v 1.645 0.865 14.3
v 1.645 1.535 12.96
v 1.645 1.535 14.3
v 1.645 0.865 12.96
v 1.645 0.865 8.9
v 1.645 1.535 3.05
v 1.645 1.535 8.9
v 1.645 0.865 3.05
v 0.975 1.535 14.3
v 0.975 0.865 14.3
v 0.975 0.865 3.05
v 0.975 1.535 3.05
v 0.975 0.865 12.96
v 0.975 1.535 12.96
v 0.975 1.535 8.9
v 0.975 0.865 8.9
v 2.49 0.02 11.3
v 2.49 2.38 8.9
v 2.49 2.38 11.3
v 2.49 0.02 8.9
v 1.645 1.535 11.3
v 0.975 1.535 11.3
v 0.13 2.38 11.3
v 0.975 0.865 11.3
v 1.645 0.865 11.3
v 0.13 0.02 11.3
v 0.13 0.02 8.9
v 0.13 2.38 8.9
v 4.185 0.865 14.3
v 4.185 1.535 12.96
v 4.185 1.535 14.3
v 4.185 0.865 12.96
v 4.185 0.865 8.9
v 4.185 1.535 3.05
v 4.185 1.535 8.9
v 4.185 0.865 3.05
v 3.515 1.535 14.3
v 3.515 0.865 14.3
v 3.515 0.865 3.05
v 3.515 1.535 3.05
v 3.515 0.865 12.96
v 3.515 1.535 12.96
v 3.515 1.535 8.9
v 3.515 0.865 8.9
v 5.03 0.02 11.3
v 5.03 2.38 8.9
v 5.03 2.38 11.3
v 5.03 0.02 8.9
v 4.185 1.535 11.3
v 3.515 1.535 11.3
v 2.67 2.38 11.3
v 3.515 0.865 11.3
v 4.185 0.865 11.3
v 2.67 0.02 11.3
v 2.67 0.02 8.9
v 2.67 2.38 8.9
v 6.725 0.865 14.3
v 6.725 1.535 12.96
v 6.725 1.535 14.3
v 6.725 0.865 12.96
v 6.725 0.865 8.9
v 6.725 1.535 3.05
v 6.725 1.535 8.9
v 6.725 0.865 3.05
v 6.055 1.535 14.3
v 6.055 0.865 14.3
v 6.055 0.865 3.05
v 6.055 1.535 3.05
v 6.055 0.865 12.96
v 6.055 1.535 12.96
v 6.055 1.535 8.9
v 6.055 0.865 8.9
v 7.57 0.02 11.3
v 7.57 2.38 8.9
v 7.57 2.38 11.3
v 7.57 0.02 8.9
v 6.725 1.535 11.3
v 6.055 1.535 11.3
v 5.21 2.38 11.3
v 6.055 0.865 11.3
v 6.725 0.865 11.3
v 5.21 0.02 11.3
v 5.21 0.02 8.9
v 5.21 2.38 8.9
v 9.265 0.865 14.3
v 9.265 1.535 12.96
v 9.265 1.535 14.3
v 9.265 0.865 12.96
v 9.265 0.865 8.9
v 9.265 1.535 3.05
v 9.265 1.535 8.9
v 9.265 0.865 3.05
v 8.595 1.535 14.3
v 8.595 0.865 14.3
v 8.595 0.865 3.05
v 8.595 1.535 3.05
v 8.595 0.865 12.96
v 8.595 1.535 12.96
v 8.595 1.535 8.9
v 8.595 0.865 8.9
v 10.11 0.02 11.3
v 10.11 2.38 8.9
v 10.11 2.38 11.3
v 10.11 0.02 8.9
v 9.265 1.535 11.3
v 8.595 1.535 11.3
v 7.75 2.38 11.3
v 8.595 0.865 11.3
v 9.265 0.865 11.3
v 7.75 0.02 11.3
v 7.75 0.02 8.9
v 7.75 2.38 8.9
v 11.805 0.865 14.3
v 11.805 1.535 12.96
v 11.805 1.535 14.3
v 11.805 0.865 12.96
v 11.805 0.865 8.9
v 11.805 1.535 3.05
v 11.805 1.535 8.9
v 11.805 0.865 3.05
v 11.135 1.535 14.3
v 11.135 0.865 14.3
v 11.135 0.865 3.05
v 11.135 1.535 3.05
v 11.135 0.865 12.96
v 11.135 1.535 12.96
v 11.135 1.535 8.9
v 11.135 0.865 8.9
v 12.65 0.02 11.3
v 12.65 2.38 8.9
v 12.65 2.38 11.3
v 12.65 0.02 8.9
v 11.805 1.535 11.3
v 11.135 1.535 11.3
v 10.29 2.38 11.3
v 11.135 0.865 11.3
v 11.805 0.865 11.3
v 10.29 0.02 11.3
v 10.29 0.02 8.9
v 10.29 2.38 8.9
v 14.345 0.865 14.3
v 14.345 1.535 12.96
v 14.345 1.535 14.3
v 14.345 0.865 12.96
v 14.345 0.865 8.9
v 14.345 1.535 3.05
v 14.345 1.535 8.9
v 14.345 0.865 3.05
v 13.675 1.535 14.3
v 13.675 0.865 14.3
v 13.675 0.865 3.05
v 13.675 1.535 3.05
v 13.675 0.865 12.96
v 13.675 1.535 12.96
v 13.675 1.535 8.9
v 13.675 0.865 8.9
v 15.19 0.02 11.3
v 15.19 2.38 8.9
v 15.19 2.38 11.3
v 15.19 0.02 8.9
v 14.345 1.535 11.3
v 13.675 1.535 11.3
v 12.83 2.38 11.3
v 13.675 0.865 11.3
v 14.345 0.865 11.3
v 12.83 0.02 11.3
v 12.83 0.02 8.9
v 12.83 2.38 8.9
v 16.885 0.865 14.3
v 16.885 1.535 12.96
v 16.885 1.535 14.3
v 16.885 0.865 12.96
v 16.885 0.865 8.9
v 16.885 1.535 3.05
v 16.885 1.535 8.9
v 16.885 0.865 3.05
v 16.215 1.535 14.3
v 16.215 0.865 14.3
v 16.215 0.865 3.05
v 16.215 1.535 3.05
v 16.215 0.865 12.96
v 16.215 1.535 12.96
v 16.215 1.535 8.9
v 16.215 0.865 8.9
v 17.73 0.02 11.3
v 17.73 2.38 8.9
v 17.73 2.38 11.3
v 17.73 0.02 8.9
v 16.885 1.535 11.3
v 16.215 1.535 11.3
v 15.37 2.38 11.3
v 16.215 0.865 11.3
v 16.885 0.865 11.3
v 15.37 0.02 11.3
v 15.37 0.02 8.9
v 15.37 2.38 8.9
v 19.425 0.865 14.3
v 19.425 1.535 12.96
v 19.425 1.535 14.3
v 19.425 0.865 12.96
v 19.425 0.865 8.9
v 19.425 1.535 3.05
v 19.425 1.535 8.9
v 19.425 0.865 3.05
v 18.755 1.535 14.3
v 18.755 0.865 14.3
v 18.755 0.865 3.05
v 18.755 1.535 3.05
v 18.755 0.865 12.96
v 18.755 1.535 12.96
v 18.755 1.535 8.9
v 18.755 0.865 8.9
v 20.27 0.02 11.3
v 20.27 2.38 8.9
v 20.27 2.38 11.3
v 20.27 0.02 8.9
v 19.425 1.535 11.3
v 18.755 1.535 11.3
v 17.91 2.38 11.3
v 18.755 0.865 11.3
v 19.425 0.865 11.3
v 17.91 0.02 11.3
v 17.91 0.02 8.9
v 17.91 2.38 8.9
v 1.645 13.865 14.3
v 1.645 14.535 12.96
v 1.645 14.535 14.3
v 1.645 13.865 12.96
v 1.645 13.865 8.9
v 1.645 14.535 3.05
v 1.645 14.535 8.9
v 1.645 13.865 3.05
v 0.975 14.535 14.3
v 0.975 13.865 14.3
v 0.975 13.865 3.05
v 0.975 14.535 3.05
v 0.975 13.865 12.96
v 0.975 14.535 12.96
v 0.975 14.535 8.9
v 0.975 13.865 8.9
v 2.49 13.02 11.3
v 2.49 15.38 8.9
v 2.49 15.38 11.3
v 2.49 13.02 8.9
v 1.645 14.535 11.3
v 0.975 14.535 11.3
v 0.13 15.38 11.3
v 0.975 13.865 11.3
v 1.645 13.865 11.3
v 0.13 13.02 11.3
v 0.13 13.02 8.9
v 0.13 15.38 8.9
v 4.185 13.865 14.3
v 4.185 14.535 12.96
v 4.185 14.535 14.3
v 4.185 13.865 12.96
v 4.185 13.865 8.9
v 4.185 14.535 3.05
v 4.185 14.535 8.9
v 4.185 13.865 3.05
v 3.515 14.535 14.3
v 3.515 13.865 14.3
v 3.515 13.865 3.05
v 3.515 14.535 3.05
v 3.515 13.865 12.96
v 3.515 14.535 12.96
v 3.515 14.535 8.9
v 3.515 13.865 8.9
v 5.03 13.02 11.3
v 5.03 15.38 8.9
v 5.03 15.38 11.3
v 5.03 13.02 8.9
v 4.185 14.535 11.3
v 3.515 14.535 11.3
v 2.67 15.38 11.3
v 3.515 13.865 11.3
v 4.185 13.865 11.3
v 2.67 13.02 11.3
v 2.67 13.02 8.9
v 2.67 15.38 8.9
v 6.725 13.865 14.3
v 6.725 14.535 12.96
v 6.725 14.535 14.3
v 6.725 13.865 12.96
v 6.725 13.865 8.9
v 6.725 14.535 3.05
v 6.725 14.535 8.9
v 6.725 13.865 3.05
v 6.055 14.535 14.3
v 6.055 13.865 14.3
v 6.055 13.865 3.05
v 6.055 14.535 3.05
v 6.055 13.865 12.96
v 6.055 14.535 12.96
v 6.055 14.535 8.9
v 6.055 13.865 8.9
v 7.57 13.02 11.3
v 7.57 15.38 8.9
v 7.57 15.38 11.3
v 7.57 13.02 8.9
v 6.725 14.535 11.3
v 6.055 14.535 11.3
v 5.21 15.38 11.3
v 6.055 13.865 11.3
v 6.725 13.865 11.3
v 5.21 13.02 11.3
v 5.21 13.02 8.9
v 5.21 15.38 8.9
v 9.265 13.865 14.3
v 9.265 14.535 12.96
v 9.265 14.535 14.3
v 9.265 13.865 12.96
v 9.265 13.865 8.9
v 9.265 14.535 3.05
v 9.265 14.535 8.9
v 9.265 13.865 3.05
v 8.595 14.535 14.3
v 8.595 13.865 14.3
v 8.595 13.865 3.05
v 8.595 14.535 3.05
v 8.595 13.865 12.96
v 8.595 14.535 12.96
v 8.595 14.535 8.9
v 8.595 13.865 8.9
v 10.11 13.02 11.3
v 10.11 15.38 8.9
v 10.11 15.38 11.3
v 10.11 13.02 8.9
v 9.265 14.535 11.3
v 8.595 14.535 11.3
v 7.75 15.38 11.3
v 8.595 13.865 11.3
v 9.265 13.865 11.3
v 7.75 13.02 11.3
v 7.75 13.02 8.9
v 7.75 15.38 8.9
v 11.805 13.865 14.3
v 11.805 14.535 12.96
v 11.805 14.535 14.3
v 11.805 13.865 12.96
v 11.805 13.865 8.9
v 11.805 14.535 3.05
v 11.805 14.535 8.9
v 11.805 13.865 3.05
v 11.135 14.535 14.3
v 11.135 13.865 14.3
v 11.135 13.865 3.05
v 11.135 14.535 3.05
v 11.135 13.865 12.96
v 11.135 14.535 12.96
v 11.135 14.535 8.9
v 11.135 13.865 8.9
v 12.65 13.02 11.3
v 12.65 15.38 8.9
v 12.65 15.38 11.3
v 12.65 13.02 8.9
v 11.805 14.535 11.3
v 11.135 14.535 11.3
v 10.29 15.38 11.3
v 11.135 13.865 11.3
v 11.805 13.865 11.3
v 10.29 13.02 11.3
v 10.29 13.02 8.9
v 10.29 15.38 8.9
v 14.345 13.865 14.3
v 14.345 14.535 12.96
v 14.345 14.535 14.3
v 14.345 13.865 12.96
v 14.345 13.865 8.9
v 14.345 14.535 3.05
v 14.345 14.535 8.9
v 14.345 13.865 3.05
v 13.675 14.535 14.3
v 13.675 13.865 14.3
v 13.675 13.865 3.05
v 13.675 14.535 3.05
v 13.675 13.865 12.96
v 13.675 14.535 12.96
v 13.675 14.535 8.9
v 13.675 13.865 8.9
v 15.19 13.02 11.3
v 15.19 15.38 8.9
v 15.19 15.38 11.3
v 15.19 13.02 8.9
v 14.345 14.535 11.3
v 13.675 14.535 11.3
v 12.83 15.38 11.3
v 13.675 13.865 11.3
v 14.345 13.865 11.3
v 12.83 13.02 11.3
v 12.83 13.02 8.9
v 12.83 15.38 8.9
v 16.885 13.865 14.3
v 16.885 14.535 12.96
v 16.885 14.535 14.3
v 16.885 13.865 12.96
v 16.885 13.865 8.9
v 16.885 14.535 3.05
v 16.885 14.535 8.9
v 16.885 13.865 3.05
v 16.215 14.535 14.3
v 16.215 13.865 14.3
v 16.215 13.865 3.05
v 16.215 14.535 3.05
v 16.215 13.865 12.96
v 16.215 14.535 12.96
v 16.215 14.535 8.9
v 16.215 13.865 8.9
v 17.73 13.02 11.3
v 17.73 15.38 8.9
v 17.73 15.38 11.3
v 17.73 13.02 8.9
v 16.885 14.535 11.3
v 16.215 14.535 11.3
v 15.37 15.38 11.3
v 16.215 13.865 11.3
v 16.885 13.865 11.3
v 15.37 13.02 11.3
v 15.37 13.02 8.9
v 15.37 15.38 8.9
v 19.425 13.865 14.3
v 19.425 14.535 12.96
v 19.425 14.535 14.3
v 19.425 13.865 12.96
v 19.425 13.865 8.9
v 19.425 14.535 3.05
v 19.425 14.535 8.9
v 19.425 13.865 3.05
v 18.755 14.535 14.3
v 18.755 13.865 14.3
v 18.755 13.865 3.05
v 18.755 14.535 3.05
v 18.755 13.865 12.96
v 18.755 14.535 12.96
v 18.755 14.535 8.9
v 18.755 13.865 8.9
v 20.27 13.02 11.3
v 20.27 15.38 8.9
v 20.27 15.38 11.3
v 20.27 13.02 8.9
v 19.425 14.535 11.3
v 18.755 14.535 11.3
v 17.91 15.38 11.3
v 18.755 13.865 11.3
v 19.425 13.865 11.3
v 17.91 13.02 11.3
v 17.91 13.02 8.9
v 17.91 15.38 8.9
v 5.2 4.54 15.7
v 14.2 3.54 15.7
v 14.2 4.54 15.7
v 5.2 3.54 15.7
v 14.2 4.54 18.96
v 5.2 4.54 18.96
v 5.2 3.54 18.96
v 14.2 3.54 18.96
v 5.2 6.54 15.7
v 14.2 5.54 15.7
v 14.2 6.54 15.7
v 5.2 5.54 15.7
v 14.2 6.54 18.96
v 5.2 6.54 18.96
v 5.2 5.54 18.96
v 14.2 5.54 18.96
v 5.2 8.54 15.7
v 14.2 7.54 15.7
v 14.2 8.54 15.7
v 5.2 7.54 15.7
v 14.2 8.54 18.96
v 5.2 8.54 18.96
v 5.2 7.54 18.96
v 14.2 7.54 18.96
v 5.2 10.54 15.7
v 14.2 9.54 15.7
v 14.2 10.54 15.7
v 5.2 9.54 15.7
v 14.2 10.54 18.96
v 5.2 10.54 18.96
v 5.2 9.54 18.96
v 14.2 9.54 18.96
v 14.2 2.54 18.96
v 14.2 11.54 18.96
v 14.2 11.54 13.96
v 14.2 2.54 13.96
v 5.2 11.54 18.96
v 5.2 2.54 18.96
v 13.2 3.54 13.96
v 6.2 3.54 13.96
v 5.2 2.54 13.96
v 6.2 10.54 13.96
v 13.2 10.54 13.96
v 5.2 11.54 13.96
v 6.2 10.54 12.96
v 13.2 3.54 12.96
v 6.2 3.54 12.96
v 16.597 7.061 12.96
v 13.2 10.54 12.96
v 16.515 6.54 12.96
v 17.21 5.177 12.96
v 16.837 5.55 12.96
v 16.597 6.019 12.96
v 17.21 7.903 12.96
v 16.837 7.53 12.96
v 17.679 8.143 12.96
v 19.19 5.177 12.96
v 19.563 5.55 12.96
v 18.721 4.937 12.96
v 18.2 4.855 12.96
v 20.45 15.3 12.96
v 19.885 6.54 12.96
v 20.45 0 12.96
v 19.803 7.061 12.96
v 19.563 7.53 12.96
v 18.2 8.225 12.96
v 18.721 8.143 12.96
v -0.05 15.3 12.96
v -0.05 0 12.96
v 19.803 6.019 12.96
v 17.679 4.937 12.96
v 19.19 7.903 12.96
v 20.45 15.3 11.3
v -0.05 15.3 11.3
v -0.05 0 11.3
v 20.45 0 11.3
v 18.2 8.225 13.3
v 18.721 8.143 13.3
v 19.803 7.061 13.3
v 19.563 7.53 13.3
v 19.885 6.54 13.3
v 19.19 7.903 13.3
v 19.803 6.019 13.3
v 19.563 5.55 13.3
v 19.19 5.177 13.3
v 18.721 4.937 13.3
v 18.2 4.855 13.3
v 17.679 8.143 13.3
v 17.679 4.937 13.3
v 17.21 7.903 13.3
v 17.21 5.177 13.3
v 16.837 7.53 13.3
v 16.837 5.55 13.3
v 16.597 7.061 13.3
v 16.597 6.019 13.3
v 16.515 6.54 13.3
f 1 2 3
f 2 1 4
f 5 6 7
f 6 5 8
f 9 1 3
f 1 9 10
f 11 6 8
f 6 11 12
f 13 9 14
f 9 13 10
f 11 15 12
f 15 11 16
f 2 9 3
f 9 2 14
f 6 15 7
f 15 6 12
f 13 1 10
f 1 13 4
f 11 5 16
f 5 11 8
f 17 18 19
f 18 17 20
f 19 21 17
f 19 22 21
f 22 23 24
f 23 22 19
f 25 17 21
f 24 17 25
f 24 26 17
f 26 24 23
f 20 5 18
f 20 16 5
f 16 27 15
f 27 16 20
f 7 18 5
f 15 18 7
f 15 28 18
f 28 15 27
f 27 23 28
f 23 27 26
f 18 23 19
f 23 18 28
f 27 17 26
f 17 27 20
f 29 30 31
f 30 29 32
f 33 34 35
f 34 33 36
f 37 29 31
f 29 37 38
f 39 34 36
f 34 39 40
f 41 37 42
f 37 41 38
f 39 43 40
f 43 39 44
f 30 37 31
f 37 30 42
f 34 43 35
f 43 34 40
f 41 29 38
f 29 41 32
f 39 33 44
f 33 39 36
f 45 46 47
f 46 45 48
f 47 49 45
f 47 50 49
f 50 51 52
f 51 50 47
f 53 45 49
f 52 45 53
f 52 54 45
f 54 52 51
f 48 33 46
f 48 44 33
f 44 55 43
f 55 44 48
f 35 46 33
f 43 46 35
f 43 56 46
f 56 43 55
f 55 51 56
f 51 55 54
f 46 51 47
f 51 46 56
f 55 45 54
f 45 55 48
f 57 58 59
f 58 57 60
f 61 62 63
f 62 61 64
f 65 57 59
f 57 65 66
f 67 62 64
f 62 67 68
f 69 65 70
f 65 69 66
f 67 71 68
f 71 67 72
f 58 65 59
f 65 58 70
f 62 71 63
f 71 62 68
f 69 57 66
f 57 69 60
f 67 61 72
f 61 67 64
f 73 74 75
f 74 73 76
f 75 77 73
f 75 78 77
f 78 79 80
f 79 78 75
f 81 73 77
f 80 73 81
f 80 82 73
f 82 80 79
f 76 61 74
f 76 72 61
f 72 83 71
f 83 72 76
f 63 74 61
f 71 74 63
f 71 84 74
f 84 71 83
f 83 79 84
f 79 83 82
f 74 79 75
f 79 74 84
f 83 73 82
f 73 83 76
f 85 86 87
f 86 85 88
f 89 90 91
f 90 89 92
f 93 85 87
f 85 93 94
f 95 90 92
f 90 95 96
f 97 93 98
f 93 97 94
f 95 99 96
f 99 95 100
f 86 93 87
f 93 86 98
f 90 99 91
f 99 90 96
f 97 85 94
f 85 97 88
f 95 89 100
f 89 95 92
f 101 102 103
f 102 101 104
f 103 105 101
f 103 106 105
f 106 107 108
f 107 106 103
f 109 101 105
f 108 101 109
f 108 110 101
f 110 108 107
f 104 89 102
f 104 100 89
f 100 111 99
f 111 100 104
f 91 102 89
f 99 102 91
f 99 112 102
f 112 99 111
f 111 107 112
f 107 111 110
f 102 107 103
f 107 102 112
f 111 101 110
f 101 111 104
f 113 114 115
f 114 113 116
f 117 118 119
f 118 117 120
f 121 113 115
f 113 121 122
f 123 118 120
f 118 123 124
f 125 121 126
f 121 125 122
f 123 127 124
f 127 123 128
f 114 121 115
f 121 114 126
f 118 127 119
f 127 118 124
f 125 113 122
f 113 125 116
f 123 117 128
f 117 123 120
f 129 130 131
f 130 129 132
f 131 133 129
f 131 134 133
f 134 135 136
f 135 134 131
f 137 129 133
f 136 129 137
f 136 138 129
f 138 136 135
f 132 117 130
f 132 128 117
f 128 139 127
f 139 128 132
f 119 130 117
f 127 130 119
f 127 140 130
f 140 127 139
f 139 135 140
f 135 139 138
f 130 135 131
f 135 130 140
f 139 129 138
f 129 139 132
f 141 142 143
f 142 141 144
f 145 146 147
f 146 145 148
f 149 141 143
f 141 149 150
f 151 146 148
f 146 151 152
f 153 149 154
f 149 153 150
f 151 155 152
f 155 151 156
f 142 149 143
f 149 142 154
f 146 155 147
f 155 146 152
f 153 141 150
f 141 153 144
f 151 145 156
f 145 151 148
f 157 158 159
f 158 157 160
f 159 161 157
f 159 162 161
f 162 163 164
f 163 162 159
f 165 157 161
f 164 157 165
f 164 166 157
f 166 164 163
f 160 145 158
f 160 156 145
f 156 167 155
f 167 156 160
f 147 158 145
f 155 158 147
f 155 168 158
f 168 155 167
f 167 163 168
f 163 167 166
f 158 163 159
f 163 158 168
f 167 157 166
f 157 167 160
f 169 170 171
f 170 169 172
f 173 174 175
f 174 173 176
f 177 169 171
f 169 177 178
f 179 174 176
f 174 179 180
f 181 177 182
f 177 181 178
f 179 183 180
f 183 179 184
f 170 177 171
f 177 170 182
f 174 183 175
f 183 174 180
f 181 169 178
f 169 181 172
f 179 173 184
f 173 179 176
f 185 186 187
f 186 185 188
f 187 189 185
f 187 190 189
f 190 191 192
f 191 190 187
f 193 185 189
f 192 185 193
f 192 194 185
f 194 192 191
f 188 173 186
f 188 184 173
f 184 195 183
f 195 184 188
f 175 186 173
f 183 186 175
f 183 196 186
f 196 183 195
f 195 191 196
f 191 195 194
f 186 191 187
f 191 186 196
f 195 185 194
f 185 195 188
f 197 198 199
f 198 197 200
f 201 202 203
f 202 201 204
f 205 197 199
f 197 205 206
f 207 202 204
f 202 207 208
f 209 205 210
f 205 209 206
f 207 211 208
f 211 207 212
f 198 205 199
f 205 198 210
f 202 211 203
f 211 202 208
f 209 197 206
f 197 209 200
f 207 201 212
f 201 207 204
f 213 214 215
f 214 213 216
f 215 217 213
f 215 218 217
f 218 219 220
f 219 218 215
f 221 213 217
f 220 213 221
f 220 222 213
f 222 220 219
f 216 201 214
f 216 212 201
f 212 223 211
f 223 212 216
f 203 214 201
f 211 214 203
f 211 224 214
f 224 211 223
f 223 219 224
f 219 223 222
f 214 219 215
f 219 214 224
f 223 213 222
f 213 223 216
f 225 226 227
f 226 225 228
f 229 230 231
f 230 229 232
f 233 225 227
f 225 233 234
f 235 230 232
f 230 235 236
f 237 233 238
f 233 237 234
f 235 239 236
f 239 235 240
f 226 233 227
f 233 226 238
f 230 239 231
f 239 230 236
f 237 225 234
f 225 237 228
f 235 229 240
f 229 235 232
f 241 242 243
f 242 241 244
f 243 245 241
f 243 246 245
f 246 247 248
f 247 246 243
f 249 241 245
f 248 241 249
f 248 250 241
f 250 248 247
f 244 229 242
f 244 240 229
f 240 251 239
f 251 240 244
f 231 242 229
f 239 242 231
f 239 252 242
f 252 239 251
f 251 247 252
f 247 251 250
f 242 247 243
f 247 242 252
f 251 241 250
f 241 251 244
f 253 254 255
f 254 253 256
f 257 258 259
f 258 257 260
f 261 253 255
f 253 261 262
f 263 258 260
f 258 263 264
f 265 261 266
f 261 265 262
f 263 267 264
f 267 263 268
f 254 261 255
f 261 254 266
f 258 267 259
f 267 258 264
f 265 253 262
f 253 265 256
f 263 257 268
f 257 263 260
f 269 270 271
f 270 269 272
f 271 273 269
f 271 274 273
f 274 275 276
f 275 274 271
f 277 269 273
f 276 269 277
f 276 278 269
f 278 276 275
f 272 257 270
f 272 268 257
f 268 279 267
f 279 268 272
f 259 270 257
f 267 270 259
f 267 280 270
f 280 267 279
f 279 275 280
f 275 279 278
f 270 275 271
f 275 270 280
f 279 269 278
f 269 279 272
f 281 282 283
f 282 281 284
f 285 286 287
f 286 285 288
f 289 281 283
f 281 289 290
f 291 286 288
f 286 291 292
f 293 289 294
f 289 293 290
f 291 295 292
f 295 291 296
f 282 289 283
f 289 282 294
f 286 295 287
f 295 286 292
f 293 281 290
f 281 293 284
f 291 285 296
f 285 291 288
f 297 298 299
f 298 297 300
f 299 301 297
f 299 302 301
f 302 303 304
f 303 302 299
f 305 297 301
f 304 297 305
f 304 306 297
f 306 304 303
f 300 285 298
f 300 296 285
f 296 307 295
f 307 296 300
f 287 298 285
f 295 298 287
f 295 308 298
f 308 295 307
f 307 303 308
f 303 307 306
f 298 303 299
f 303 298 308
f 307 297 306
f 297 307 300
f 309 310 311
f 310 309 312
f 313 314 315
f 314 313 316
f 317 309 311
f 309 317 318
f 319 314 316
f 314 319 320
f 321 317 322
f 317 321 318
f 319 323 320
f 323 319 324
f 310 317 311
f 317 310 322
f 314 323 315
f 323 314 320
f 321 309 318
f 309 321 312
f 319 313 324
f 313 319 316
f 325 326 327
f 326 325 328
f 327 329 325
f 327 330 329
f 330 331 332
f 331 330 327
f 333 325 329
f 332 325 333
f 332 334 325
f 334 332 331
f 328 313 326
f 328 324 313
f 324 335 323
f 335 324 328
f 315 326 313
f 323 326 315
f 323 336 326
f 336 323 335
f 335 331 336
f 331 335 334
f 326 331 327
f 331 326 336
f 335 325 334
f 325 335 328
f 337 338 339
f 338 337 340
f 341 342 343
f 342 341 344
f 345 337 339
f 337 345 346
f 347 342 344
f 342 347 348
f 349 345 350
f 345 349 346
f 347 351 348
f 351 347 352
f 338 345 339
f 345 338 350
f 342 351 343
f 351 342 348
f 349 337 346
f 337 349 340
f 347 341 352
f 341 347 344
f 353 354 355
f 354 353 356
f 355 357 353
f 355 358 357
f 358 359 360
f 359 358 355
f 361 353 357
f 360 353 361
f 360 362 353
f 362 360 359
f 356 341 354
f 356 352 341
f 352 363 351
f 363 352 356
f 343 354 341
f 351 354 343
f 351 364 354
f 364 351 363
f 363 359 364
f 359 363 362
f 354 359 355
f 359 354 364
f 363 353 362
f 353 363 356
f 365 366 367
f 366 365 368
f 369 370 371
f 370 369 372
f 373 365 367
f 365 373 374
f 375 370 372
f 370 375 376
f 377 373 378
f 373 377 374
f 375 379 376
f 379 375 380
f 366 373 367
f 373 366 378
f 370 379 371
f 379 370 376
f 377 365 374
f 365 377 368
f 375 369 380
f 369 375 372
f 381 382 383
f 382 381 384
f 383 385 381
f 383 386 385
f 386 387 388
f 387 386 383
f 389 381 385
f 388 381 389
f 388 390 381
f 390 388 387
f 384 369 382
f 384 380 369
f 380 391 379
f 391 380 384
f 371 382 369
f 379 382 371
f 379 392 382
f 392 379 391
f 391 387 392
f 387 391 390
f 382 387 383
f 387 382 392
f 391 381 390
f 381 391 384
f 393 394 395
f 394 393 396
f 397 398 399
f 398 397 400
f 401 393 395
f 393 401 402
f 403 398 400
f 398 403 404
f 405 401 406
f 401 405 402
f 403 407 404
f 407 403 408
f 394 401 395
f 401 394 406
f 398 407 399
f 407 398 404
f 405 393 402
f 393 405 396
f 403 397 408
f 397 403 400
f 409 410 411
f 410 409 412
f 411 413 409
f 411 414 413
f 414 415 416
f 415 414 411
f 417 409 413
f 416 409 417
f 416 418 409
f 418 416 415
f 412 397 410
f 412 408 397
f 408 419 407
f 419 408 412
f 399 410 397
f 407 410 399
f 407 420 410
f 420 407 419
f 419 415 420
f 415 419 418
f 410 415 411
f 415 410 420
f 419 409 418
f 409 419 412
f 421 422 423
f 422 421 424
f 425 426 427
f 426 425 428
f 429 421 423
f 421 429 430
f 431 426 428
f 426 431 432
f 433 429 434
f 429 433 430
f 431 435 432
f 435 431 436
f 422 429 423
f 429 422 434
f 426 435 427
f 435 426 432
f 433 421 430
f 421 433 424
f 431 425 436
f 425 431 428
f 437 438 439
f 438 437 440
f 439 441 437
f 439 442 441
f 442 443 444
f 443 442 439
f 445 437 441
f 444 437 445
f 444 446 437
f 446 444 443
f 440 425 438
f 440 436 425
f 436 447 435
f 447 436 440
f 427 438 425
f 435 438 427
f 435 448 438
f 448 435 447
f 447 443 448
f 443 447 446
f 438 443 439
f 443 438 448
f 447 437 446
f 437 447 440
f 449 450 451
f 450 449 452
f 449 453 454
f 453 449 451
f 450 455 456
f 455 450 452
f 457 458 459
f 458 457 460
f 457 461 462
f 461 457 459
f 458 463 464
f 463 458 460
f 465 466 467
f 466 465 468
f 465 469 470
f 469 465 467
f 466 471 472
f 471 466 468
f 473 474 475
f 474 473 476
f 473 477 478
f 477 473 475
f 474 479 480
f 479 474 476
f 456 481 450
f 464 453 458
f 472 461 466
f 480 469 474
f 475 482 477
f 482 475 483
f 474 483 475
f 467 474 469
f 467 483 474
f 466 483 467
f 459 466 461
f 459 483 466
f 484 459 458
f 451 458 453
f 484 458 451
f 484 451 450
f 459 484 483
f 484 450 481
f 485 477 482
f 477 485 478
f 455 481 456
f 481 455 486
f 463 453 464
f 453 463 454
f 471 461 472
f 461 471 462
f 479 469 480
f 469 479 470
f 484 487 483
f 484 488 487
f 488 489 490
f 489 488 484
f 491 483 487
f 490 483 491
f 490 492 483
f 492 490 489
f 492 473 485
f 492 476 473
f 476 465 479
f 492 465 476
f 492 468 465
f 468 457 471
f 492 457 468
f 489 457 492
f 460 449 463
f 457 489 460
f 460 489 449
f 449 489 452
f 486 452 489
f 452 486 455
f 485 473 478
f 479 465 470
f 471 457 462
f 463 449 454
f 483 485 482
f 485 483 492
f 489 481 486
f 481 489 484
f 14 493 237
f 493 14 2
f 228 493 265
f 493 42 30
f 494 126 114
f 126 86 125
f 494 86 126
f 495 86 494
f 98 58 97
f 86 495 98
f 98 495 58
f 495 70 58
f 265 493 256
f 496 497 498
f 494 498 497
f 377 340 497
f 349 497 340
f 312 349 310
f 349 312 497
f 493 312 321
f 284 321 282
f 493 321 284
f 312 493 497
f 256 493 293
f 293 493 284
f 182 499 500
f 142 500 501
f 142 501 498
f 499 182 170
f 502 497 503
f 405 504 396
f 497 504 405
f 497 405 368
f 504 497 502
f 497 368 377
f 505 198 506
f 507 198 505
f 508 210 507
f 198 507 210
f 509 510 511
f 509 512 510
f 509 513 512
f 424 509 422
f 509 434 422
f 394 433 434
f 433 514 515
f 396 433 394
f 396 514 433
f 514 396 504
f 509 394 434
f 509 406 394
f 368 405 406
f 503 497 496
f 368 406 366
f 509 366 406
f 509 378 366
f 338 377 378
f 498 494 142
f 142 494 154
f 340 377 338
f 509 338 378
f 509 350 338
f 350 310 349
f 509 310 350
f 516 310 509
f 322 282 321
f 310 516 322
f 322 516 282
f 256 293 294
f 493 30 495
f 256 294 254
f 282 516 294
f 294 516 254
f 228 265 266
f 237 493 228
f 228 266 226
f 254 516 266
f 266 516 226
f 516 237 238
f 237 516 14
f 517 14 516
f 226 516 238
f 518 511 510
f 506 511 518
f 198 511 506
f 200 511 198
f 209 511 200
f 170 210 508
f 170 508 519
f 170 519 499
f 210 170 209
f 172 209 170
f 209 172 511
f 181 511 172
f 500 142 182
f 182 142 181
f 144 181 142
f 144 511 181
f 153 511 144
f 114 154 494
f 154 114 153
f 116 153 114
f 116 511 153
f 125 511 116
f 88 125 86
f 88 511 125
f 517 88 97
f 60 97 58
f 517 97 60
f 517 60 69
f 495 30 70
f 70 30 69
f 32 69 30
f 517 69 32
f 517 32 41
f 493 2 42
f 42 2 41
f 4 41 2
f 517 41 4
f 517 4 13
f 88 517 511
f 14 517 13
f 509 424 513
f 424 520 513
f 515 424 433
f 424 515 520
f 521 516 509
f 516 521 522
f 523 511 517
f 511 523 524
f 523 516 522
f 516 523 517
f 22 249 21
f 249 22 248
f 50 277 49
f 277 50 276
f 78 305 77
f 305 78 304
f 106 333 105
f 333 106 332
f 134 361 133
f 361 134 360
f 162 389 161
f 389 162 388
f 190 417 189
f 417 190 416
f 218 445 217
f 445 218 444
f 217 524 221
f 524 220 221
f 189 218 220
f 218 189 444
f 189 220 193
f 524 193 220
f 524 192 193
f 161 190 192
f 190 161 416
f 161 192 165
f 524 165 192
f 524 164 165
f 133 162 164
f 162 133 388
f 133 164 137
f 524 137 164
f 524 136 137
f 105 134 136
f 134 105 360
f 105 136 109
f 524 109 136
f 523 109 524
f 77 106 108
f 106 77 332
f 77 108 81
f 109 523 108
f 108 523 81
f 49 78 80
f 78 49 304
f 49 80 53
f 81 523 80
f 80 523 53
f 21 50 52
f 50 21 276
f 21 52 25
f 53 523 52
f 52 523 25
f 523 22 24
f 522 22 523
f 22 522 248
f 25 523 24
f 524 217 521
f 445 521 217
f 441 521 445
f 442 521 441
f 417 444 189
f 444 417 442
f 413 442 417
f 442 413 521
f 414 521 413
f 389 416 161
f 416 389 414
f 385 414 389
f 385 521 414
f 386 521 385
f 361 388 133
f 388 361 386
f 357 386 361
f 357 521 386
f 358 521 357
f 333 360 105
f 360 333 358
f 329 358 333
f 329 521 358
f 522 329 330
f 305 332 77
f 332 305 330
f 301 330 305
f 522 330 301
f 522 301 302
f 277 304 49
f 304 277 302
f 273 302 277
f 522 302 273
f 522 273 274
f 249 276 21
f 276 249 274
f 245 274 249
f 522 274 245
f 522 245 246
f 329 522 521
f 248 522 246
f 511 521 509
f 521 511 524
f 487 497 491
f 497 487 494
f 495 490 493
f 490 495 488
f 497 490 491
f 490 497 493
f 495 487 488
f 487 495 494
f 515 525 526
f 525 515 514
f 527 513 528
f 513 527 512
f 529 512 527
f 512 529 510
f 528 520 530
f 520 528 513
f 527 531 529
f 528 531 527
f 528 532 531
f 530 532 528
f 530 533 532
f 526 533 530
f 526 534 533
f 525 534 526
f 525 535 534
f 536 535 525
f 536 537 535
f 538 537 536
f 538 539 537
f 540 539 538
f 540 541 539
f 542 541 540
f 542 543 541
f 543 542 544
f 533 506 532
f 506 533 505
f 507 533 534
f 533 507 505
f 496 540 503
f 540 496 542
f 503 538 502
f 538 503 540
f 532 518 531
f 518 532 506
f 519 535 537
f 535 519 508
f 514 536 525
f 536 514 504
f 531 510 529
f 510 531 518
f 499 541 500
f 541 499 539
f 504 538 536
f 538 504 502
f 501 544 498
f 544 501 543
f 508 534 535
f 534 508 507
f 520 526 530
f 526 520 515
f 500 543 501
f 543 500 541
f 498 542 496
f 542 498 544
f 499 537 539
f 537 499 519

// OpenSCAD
// file: header_pins.scad
/*
  Breakaway Header Pins: pitch 2.54, adjustable
  Aaron Ciuffo
  December 23 2015
  GPL V3

  derived from Molex KK 100 break-away header:
  http://www.molex.com/pdm_docs/sd/022032041_sd.pdf

  Usage (default values shown): 
  ```
  use </path/to/libraries/header_pins.scad>
  //full
  headerPins(columns = 3, rows = 2, centerV = false, center = true, pitch = 2.52);
  //simple
  headerPins(3, 2);
  ```
  columns = integer number of columns (X axis)
  rows = integer number of rows (Y axis)
  centerV = vertically center around base - fale places bottom at origin
  center = center the array at the origin
  pitch = distance between center of each pin

  Note: 
  * the breakaway connector is a bit of a fudge and does not appear at the same
    Z height for centered/versus non centered; this should be largely irrelevant 

  updates can be found at GitHub:
  https://github.com/txoof/OpenSCAD_electronics

*/

/*[Dimensions]*/
//Columns
columns = 3; //[1:30]
//Rows
rows = 2; //[1:5]
//Pitch
pitch = 2.54; //[1.25, 1.27, 2, 2.54, 3.5, 3.96]

pinHeight=11.25;

pinAboveNylon=3;

module singlePin(center = false, locate = false, v = false, pinHeight=14.22, pinAboveNylon = 7.49) {
  pinDimensions = [.67, .67, pinHeight];
  nylonDimensions = [2.36, 2.36, 2.4];

  trans = center == false ? [0, 0, nylonDimensions[2]/2] : [0, 0, 0];

  translate(trans)
  union() {
    translate([0, 0, (-pinDimensions[2]/2+nylonDimensions[2]/2)+pinAboveNylon])
      color("gold")
      cube(pinDimensions, center = true);    
    color("darkgray")
      cube(nylonDimensions, center =true);
    if (locate) {
      color("red")
        cylinder(r = 0.1, h = pinDimensions[2]*5, center = true);
    }
  }

  if (v) {
    echo("single pin dimension:", pinDimensions);
    echo("pin above nylon:", pinAboveNylon);
  }

}

module headerPins(columns = 3, rows = 2, centerV = false, center = true, 
                  pitch = 2.54, locate = false, v = false, pinHeight=14.22, pinAboveNylon=7.49) {
  transV = centerV == false ? pitch/2 : 0; // vertical center

  trans = center == false ? [0, 0, 0] : [-(columns-1)*pitch/2, -(rows-1)*pitch/2, 0];
  if (v) {
    echo("header pin array");
    echo("usage: columns, rows, centerV, center, pitch, locate, v(erbose)");
  }

  translate(trans) 
  union() {
    for (i = [0:columns-1]) {
      for (j = [0:rows-1]) {
        translate([pitch*i, pitch*j, 0])
          singlePin(locate = locate, v = v, pinHeight=pinHeight, pinAboveNylon=pinAboveNylon);
      }
    }
    translate([0, 0, -pitch/2+transV])
      color("black")
      cube([pitch*(columns-1), pitch*(rows-1), 2]);
  }
}

//singlePin();
headerPins(columns = columns , rows = rows, pitch = pitch, pinHeight = pinHeight, pinAboveNylon=pinAboveNylon);
// main file
/* Pololu stepper driver board
  Neeraj Verma
  July 23 2018
  GPL V3
  
  use </path/to/libraries/step_stick.scad>
  //full
  step_stick(sinkHeight=5);
  //simple
  step_stick();
*/

use <header_pins.scad>

sinkHeight=5;
heightAbovePCBSurface = 8.9;

module board(sinkHeight=5) {
// pcb
translate([15.25,0,-1]) rotate(90) color("red") cube([15.3,20.5,1.66]);   
// chip
translate([1,3.54,0.66]) cube([7,7,1]);    
// heat sink    
color("silver") difference() {
    translate([0,2.54,1.66]) cube([9,9,sinkHeight]);
    union() {
        translate([-.1,3.54,3.4]) cube([10,1,sinkHeight+1]);
        translate([-.1,5.54,3.4]) cube([10,1,sinkHeight+1]);
        translate([-.1,7.54,3.4]) cube([10,1,sinkHeight+1]);
        translate([-.1,9.54,3.4]) cube([10,1,sinkHeight+1]);
    }    
}    
// pot
translate([13,6.54,0.5]) color("silver") cylinder(h=0.5,d=3.37, $fn=20);   
} 

module step_stick(sinkHeight=5, heightAbovePCBSurface=8.9) {
    translate([10.2,1.2,heightAbovePCBSurface]) union() {
        headerPins(8, 1, pinAboveNylon=3, pinHeight=11.25);
        translate ([0,13,0]) headerPins(8, 1, pinAboveNylon=3, pinHeight=11.25);
        translate([-5,-1.2, 3.4]) board(sinkHeight=sinkHeight);
    }
}

step_stick(sinkHeight=sinkHeight, heightAbovePCBSurface=heightAbovePCBSurface);
